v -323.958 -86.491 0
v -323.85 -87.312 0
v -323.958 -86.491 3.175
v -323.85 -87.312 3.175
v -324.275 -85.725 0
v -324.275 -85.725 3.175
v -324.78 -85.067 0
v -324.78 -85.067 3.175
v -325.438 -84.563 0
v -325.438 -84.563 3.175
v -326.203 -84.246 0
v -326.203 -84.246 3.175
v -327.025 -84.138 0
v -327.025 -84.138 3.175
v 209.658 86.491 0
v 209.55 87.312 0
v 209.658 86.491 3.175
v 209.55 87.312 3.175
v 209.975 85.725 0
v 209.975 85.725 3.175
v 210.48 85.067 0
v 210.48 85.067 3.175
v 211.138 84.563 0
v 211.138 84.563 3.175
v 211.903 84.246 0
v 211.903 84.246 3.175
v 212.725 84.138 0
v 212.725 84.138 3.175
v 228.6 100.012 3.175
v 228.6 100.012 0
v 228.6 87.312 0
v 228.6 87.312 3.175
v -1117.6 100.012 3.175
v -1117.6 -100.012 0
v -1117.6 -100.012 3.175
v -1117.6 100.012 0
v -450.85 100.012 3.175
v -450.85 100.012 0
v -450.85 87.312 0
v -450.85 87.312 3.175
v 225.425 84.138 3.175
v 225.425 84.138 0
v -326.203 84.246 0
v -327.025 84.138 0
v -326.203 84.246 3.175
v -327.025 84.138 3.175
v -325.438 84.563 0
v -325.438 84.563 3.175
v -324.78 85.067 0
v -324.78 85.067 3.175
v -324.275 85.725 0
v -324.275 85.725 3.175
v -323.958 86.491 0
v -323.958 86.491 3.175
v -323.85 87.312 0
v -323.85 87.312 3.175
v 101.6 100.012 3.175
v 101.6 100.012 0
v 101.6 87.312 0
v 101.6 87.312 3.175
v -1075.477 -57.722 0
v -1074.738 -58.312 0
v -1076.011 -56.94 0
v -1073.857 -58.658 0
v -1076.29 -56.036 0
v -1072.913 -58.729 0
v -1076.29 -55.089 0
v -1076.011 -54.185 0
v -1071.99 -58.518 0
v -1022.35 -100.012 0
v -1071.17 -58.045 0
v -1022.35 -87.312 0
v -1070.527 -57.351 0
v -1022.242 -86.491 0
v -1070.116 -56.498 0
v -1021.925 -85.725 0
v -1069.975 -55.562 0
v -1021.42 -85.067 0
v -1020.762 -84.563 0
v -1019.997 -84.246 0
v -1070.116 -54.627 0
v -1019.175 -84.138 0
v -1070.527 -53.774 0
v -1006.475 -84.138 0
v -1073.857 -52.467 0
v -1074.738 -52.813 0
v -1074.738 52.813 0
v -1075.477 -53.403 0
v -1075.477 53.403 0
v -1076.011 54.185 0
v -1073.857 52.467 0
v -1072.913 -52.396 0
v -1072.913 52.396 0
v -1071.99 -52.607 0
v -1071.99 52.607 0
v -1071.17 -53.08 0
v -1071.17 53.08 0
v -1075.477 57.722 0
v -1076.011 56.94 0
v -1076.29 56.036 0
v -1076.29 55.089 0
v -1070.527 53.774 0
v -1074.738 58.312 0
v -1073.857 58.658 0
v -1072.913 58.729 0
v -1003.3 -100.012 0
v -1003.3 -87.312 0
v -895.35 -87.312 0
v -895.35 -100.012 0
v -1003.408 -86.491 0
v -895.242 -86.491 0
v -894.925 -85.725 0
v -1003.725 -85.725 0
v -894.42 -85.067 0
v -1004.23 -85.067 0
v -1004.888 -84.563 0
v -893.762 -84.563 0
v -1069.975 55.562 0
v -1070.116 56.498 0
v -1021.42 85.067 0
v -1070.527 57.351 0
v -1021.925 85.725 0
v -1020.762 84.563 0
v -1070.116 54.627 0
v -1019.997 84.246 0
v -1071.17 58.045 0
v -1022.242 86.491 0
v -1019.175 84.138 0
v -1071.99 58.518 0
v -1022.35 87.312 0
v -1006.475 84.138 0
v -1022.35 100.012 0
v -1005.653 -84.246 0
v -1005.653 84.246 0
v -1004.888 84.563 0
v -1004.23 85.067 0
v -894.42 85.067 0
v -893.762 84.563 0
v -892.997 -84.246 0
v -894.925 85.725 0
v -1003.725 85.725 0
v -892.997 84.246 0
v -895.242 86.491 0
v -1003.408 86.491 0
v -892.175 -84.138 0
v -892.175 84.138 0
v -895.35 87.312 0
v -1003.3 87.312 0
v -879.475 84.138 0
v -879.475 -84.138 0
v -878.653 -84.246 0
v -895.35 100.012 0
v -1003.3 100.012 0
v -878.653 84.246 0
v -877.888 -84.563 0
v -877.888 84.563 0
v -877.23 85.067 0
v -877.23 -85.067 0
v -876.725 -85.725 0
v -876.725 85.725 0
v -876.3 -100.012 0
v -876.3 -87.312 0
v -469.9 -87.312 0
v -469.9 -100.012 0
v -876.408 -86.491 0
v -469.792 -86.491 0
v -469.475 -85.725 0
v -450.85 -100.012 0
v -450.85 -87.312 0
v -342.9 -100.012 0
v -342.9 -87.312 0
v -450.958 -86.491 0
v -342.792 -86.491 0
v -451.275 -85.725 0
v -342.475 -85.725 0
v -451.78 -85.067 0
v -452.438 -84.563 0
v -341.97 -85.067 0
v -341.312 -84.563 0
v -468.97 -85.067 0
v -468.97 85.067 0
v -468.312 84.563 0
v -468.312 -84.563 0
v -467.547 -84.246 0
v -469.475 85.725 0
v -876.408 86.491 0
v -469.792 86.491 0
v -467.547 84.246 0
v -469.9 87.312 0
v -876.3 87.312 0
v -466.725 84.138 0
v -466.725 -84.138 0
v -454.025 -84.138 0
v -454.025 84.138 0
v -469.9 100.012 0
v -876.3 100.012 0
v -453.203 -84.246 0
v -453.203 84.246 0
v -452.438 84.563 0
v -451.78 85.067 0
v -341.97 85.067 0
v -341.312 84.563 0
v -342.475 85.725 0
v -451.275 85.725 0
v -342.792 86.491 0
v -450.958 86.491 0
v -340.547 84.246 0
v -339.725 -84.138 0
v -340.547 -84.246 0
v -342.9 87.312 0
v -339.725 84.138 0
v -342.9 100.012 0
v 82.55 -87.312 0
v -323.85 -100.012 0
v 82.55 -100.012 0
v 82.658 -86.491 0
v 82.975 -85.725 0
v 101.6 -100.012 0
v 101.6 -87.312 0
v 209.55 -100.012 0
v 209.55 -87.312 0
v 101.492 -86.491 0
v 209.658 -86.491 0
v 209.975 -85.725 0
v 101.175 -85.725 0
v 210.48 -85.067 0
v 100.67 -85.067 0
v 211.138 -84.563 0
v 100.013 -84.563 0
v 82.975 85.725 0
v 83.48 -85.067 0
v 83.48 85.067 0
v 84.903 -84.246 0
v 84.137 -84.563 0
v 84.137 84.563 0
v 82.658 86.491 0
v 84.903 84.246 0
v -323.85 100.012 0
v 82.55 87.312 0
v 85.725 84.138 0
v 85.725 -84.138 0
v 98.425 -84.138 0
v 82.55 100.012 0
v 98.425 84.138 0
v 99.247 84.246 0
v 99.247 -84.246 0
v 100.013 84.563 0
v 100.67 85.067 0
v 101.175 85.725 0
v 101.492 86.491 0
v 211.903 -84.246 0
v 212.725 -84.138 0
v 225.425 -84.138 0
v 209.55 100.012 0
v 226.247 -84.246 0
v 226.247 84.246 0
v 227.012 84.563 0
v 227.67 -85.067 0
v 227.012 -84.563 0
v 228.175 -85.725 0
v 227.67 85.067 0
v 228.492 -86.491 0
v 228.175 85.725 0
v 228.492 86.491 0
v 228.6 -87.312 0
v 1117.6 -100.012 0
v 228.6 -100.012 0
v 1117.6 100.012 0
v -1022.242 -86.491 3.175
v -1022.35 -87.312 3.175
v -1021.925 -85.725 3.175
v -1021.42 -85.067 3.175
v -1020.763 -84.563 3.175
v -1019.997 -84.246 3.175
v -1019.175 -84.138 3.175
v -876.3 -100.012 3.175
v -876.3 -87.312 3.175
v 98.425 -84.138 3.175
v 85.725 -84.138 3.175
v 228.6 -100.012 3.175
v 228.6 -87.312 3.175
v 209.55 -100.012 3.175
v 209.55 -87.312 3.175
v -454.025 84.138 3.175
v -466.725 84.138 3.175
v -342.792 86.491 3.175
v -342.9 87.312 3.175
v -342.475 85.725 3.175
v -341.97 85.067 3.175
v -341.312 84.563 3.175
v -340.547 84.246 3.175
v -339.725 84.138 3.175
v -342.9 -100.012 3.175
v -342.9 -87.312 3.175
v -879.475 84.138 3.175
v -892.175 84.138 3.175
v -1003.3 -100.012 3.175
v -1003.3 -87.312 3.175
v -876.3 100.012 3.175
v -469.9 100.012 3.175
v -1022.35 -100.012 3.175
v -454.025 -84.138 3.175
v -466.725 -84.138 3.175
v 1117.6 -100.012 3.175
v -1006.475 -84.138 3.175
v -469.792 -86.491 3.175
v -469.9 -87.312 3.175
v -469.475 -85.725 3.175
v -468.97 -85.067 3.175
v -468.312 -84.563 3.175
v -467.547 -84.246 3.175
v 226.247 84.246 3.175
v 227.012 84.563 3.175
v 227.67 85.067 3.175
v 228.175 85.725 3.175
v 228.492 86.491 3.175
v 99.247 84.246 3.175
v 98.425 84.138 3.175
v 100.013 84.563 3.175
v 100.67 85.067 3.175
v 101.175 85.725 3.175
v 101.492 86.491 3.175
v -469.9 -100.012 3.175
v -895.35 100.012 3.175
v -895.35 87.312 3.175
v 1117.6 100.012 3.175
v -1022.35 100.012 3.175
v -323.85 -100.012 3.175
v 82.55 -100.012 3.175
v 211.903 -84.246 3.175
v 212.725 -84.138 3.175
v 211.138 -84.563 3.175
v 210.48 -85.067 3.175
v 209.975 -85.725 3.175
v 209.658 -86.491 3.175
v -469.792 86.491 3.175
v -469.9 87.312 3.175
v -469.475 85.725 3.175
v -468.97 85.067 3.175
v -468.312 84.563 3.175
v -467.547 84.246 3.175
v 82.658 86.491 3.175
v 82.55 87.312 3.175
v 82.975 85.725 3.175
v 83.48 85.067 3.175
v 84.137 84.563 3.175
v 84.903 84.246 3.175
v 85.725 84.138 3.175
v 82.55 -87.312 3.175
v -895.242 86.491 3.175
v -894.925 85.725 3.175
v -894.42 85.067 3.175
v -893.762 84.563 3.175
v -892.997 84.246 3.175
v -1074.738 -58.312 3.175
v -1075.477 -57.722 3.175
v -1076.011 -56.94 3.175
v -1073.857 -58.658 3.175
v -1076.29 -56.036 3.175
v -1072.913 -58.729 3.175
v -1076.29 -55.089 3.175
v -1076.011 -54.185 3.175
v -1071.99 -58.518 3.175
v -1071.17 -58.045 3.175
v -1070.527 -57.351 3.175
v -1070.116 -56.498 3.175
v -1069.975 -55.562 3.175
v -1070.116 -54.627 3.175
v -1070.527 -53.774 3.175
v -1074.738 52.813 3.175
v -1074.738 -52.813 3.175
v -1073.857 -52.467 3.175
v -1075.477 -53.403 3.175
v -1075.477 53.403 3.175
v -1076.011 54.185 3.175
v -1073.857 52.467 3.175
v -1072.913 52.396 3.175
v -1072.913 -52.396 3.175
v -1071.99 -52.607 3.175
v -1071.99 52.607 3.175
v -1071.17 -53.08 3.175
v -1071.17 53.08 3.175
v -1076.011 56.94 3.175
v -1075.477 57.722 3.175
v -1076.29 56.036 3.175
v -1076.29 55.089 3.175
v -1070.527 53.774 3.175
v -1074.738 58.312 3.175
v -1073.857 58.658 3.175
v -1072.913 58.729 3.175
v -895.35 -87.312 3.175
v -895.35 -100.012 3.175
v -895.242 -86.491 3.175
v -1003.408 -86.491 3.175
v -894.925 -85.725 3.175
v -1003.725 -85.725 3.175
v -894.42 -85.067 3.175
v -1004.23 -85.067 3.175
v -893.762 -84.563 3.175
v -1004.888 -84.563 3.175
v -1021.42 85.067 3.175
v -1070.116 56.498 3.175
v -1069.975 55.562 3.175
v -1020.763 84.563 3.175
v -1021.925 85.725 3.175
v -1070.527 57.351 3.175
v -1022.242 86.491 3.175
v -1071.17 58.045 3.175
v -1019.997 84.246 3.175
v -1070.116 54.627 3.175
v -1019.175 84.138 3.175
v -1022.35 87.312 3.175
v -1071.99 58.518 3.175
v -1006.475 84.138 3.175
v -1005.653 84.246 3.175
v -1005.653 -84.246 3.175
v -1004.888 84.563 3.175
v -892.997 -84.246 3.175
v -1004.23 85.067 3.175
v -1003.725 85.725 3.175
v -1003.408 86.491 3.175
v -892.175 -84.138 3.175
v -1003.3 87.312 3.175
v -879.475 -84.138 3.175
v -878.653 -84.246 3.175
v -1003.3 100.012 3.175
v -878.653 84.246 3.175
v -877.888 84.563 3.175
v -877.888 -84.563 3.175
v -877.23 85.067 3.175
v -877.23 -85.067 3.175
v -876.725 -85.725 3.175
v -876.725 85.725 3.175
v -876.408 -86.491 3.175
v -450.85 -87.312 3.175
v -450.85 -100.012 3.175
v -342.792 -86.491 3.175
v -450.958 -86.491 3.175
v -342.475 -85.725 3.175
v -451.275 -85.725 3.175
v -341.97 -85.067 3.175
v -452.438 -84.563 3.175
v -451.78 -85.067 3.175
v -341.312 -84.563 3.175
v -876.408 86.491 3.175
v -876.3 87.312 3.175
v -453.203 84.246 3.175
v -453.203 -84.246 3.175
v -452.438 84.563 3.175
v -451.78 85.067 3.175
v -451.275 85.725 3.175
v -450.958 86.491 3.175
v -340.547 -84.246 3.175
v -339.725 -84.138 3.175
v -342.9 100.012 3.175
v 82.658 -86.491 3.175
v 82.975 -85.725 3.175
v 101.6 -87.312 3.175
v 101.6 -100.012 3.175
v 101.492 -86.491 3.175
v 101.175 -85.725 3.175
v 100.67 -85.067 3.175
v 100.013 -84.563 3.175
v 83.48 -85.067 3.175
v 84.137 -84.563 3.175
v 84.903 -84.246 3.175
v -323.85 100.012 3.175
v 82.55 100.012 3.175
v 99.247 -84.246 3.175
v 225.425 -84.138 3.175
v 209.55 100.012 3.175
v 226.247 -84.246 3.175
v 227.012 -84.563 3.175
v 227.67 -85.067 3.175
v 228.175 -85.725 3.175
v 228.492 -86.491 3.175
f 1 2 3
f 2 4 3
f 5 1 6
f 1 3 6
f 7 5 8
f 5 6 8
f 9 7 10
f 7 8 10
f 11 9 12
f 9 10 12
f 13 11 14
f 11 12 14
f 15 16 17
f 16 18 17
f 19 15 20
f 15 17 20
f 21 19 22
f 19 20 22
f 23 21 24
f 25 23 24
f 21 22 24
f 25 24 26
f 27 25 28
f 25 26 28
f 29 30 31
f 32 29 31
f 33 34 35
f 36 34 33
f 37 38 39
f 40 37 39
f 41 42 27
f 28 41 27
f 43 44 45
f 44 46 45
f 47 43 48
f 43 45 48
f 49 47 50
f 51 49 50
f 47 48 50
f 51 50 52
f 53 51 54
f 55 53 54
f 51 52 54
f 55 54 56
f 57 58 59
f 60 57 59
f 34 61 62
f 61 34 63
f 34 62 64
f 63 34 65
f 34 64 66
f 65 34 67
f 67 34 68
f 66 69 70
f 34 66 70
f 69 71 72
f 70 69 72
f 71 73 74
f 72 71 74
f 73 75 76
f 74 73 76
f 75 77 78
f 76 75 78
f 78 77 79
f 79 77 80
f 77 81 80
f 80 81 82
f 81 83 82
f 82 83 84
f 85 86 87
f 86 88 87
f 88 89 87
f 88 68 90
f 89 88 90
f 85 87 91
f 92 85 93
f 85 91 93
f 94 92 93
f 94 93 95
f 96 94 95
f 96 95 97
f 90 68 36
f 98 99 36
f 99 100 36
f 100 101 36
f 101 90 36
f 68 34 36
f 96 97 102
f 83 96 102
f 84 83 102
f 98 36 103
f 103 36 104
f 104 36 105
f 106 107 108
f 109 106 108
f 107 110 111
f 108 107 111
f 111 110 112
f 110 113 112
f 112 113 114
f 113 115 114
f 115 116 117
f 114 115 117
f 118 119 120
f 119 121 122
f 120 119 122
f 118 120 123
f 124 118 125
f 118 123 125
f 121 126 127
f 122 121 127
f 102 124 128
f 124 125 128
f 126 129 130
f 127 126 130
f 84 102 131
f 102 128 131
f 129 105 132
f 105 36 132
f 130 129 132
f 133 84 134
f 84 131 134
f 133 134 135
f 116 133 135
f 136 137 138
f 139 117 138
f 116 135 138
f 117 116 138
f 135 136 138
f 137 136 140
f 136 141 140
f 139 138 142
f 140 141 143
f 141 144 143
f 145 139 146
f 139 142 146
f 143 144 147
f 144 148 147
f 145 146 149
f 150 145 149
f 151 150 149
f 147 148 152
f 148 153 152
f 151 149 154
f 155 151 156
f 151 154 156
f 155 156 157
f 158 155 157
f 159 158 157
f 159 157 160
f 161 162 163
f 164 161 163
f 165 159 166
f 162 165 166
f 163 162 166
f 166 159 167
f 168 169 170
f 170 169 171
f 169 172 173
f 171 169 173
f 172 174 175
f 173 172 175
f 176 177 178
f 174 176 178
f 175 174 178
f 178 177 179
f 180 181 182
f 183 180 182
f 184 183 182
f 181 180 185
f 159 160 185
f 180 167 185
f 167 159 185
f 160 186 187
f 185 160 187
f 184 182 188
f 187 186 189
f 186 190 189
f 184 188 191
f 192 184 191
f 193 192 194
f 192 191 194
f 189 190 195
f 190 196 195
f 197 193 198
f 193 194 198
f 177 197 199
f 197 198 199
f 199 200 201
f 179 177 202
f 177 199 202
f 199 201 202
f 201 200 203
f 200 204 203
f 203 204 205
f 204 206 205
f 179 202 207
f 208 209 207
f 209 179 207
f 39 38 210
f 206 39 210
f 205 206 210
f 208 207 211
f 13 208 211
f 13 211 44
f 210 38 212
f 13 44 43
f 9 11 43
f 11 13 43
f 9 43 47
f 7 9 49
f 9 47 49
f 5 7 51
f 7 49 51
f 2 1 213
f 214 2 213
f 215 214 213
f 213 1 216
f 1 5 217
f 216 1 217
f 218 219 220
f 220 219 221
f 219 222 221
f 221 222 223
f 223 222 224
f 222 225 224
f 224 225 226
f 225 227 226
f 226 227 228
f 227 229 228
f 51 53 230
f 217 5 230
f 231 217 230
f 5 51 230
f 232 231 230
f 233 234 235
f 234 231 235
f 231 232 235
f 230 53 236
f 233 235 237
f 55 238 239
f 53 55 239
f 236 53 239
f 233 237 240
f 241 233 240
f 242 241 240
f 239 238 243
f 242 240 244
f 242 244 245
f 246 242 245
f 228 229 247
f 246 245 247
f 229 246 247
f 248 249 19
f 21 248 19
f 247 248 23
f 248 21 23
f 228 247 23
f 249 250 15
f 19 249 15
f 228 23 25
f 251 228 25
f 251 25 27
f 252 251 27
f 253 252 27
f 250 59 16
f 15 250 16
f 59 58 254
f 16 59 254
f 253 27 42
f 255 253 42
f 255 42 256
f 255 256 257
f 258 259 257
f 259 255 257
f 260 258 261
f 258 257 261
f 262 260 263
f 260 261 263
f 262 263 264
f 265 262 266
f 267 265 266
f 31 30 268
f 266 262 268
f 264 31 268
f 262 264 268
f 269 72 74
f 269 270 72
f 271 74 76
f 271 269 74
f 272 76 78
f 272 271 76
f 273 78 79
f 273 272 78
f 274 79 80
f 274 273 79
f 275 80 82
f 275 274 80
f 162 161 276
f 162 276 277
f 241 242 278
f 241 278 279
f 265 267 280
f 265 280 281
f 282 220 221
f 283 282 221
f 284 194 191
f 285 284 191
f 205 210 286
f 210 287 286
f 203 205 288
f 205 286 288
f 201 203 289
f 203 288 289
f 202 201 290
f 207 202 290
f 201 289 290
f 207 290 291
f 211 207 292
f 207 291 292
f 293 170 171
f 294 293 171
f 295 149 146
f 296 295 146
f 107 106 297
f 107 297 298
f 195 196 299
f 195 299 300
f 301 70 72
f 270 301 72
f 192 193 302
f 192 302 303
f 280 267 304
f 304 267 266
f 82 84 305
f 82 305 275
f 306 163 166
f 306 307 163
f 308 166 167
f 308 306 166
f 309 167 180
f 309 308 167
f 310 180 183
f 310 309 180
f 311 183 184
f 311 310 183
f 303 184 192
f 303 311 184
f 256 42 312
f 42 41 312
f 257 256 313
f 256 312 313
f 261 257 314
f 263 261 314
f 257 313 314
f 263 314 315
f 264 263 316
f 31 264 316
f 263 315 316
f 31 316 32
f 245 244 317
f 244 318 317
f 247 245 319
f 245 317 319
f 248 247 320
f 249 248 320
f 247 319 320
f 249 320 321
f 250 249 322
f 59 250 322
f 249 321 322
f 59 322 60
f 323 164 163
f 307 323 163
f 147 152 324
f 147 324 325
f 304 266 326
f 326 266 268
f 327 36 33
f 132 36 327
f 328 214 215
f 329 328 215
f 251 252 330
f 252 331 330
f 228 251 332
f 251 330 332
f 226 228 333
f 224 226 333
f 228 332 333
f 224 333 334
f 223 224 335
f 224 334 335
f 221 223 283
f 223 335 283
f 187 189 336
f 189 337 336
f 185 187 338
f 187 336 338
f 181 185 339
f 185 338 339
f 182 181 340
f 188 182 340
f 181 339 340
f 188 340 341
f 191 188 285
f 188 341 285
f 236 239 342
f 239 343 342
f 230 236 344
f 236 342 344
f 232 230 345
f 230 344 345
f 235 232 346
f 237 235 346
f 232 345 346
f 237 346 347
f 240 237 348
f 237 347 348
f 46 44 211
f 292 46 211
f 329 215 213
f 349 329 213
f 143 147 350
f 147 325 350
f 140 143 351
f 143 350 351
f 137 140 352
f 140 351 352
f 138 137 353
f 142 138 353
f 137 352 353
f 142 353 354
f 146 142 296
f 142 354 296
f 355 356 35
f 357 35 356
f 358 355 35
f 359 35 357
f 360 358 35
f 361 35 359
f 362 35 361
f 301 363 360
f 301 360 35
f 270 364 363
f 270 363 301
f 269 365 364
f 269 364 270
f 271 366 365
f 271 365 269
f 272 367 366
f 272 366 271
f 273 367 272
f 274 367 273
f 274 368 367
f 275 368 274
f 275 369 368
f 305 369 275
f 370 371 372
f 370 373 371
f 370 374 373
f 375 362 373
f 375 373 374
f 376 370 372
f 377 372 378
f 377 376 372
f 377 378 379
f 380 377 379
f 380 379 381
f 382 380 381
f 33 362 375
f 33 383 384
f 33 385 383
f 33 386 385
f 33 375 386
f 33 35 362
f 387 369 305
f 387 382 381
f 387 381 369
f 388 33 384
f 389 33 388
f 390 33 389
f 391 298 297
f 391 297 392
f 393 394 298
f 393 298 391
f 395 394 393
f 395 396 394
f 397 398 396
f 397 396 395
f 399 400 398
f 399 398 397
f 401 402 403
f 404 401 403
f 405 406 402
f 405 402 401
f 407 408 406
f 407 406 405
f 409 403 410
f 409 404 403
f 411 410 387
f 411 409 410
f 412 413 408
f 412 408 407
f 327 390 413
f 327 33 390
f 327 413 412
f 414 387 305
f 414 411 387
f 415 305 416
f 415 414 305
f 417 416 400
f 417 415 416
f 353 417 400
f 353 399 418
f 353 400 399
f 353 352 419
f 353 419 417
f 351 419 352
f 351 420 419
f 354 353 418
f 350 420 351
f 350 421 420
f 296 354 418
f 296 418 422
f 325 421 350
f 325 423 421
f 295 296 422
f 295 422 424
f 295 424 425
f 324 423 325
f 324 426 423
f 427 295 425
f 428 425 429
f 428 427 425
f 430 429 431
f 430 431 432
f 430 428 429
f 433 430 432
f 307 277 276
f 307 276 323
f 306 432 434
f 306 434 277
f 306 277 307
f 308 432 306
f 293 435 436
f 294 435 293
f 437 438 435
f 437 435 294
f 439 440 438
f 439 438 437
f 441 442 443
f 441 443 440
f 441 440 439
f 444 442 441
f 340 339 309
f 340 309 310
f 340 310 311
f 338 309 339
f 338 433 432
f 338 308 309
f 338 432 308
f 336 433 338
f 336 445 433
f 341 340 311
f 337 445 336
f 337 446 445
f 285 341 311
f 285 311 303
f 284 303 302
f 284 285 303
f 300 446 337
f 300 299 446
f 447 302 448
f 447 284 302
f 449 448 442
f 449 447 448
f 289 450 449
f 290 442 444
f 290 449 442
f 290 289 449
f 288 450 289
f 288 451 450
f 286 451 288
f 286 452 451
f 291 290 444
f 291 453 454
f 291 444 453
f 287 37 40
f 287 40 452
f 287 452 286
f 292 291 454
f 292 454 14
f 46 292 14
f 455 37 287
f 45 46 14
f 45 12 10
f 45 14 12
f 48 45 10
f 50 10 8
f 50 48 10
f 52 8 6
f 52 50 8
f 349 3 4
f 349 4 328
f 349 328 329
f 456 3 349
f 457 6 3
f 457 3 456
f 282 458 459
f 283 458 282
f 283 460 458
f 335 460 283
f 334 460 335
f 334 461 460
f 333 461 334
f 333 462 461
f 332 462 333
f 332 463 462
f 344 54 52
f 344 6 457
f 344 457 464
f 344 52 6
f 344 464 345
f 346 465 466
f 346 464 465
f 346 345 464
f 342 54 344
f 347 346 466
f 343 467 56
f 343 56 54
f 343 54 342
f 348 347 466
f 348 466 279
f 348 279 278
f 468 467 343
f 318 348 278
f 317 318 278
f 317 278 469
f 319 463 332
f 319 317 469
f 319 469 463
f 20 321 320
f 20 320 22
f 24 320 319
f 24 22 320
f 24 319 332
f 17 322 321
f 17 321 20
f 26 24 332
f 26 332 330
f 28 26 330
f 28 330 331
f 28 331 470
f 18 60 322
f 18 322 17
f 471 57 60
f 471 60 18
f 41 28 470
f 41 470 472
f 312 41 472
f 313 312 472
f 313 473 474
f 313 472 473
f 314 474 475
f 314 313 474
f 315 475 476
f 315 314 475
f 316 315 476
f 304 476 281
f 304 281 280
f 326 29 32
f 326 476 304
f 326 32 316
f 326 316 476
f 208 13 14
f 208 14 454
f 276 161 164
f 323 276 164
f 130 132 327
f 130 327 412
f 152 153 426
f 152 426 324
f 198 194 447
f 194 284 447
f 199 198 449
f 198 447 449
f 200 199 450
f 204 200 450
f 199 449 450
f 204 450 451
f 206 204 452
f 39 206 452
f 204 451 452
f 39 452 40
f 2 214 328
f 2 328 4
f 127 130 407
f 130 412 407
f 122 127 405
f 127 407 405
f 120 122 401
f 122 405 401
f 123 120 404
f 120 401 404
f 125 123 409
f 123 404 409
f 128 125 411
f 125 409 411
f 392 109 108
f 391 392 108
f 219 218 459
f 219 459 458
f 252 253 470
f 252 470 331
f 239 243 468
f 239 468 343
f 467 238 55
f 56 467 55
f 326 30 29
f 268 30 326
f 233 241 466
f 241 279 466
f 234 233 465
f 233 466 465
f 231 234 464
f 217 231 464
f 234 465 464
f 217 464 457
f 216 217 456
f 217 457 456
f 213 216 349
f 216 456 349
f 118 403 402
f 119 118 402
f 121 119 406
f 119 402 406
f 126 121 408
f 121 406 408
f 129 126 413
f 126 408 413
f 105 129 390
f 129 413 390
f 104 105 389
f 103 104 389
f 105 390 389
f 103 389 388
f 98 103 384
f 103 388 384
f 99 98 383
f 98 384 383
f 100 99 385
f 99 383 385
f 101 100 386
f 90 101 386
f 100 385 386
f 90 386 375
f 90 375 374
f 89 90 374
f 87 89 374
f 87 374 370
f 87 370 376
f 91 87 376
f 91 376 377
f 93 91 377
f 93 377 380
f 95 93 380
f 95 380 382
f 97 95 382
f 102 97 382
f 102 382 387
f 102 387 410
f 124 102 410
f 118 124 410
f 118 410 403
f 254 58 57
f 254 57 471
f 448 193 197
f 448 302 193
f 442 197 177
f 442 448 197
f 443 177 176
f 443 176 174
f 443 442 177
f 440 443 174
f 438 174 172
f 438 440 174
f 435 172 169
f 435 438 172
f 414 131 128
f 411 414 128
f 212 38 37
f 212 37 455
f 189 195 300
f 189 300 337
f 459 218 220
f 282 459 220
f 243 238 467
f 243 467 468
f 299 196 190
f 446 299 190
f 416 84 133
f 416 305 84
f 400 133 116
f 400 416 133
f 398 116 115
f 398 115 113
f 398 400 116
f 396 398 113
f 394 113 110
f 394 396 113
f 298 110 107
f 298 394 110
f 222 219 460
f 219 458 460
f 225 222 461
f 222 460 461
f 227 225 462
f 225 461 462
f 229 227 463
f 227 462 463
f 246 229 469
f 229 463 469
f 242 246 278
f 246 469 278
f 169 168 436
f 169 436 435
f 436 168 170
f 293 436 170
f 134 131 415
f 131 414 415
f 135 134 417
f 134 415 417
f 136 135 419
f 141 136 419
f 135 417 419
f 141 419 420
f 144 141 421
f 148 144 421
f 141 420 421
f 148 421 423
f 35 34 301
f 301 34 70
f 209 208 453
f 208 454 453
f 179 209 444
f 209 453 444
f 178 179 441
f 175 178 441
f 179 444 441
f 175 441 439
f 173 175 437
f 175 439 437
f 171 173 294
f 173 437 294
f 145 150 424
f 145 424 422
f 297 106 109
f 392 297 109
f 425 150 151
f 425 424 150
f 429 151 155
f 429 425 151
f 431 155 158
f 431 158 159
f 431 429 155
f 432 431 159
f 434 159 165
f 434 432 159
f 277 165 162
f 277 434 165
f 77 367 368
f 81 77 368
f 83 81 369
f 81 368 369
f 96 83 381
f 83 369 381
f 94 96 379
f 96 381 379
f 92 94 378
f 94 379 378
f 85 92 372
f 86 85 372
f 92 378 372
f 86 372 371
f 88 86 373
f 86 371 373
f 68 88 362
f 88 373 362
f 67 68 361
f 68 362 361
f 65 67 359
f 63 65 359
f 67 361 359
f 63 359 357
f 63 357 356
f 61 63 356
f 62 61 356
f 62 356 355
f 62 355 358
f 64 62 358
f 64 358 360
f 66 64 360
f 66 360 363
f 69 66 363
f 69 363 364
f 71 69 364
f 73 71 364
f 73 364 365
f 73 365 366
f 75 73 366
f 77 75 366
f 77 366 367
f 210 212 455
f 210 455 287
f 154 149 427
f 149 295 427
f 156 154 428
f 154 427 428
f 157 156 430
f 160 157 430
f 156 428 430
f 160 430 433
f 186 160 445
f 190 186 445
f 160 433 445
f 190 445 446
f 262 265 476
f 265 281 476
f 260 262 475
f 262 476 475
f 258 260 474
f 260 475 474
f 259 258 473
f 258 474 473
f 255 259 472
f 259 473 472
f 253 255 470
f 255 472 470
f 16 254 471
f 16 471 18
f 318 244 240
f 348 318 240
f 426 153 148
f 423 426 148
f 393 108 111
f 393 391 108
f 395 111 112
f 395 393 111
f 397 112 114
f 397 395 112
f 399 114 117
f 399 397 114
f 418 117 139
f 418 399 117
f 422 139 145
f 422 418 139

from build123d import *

# Parameters (mm, degrees)
SKETCH1_W                   = 2235.2
SKETCH1_H                   = 200.025
BOSS_EXTRUDE1_DEPTH         = 3.175
SKETCH2_W                   = 19.05
SKETCH2_H                   = 15.875
CUT_EXTRUDE1_DEPTH          = 4.175
F_1_4_0_25_DIAMETER_HOLE1_D = 6.35
FILLET1_R                   = 3.175
FILLET1_OF_MIRROR1_R        = 3.175


with BuildPart() as part:
    # Sketch1 → Boss-Extrude1 (new body)
    with BuildSketch(Plane.XY):
        Rectangle(SKETCH1_W, SKETCH1_H)
    extrude(amount=BOSS_EXTRUDE1_DEPTH)

    # Sketch2 → Cut-Extrude1 (cut, through all)
    with BuildSketch(Plane(origin=(0, 0, 0), x_dir=(-1, 0, 0), z_dir=(0, 0, -1))):
        with Locations((-219.075, -92.075)):
            Rectangle(SKETCH2_W, SKETCH2_H)
        with Locations((-92.075, -92.075)):
            Rectangle(SKETCH2_W, SKETCH2_H)
        with Locations((333.375, -92.075)):
            Rectangle(SKETCH2_W, SKETCH2_H)
        with Locations((460.375, -92.075)):
            Rectangle(SKETCH2_W, SKETCH2_H)
        with Locations((885.825, -92.075)):
            Rectangle(SKETCH2_W, SKETCH2_H)
        with Locations((1012.825, -92.075)):
            Rectangle(SKETCH2_W, SKETCH2_H)
    cut_extrude1 = extrude(amount=-CUT_EXTRUDE1_DEPTH, mode=Mode.SUBTRACT)

    # 1/4 (0.25) Diameter Hole1 (through all)
    with Locations(Plane(origin=(0, 0, 0), x_dir=(-1, 0, 0), z_dir=(0, 0, -1))):
        with Locations((1073.15, -55.5625), (1073.15, 55.5625)):
            Hole(F_1_4_0_25_DIAMETER_HOLE1_D / 2)

    # Fillet1
    fillet1_edges = [part.edges().sort_by_distance(p)[0] for p in [
        (228.6, -84.1375, 1.5875),
        (209.55, -84.1375, 1.5875),
        (101.6, -84.1375, 1.5875),
        (82.55, -84.1375, 1.5875),
        (-323.85, -84.1375, 1.5875),
        (-342.9, -84.1375, 1.5875),
        (-450.85, -84.1375, 1.5875),
        (-469.9, -84.1375, 1.5875),
        (-876.3, -84.1375, 1.5875),
        (-895.35, -84.1375, 1.5875),
        (-1003.3, -84.1375, 1.5875),
        (-1022.35, -84.1375, 1.5875),
    ]]
    fillet(fillet1_edges, radius=FILLET1_R)

    # Mirror1: Cut-Extrude1 across plane
    add(cut_extrude1.mirror(Plane.ZX), mode=Mode.SUBTRACT)

    # Fillet1 of Mirror1
    fillet1_of_mirror1_edges = [part.edges().sort_by_distance(p)[0] for p in [
        (228.6, 84.1375, 1.5875),
        (209.55, 84.1375, 1.5875),
        (101.6, 84.1375, 1.5875),
        (82.55, 84.1375, 1.5875),
        (-323.85, 84.1375, 1.5875),
        (-342.9, 84.1375, 1.5875),
        (-450.85, 84.1375, 1.5875),
        (-469.9, 84.1375, 1.5875),
        (-876.3, 84.1375, 1.5875),
        (-895.35, 84.1375, 1.5875),
        (-1003.3, 84.1375, 1.5875),
        (-1022.35, 84.1375, 1.5875),
    ]]
    fillet(fillet1_of_mirror1_edges, radius=FILLET1_OF_MIRROR1_R)


solid = part.part
